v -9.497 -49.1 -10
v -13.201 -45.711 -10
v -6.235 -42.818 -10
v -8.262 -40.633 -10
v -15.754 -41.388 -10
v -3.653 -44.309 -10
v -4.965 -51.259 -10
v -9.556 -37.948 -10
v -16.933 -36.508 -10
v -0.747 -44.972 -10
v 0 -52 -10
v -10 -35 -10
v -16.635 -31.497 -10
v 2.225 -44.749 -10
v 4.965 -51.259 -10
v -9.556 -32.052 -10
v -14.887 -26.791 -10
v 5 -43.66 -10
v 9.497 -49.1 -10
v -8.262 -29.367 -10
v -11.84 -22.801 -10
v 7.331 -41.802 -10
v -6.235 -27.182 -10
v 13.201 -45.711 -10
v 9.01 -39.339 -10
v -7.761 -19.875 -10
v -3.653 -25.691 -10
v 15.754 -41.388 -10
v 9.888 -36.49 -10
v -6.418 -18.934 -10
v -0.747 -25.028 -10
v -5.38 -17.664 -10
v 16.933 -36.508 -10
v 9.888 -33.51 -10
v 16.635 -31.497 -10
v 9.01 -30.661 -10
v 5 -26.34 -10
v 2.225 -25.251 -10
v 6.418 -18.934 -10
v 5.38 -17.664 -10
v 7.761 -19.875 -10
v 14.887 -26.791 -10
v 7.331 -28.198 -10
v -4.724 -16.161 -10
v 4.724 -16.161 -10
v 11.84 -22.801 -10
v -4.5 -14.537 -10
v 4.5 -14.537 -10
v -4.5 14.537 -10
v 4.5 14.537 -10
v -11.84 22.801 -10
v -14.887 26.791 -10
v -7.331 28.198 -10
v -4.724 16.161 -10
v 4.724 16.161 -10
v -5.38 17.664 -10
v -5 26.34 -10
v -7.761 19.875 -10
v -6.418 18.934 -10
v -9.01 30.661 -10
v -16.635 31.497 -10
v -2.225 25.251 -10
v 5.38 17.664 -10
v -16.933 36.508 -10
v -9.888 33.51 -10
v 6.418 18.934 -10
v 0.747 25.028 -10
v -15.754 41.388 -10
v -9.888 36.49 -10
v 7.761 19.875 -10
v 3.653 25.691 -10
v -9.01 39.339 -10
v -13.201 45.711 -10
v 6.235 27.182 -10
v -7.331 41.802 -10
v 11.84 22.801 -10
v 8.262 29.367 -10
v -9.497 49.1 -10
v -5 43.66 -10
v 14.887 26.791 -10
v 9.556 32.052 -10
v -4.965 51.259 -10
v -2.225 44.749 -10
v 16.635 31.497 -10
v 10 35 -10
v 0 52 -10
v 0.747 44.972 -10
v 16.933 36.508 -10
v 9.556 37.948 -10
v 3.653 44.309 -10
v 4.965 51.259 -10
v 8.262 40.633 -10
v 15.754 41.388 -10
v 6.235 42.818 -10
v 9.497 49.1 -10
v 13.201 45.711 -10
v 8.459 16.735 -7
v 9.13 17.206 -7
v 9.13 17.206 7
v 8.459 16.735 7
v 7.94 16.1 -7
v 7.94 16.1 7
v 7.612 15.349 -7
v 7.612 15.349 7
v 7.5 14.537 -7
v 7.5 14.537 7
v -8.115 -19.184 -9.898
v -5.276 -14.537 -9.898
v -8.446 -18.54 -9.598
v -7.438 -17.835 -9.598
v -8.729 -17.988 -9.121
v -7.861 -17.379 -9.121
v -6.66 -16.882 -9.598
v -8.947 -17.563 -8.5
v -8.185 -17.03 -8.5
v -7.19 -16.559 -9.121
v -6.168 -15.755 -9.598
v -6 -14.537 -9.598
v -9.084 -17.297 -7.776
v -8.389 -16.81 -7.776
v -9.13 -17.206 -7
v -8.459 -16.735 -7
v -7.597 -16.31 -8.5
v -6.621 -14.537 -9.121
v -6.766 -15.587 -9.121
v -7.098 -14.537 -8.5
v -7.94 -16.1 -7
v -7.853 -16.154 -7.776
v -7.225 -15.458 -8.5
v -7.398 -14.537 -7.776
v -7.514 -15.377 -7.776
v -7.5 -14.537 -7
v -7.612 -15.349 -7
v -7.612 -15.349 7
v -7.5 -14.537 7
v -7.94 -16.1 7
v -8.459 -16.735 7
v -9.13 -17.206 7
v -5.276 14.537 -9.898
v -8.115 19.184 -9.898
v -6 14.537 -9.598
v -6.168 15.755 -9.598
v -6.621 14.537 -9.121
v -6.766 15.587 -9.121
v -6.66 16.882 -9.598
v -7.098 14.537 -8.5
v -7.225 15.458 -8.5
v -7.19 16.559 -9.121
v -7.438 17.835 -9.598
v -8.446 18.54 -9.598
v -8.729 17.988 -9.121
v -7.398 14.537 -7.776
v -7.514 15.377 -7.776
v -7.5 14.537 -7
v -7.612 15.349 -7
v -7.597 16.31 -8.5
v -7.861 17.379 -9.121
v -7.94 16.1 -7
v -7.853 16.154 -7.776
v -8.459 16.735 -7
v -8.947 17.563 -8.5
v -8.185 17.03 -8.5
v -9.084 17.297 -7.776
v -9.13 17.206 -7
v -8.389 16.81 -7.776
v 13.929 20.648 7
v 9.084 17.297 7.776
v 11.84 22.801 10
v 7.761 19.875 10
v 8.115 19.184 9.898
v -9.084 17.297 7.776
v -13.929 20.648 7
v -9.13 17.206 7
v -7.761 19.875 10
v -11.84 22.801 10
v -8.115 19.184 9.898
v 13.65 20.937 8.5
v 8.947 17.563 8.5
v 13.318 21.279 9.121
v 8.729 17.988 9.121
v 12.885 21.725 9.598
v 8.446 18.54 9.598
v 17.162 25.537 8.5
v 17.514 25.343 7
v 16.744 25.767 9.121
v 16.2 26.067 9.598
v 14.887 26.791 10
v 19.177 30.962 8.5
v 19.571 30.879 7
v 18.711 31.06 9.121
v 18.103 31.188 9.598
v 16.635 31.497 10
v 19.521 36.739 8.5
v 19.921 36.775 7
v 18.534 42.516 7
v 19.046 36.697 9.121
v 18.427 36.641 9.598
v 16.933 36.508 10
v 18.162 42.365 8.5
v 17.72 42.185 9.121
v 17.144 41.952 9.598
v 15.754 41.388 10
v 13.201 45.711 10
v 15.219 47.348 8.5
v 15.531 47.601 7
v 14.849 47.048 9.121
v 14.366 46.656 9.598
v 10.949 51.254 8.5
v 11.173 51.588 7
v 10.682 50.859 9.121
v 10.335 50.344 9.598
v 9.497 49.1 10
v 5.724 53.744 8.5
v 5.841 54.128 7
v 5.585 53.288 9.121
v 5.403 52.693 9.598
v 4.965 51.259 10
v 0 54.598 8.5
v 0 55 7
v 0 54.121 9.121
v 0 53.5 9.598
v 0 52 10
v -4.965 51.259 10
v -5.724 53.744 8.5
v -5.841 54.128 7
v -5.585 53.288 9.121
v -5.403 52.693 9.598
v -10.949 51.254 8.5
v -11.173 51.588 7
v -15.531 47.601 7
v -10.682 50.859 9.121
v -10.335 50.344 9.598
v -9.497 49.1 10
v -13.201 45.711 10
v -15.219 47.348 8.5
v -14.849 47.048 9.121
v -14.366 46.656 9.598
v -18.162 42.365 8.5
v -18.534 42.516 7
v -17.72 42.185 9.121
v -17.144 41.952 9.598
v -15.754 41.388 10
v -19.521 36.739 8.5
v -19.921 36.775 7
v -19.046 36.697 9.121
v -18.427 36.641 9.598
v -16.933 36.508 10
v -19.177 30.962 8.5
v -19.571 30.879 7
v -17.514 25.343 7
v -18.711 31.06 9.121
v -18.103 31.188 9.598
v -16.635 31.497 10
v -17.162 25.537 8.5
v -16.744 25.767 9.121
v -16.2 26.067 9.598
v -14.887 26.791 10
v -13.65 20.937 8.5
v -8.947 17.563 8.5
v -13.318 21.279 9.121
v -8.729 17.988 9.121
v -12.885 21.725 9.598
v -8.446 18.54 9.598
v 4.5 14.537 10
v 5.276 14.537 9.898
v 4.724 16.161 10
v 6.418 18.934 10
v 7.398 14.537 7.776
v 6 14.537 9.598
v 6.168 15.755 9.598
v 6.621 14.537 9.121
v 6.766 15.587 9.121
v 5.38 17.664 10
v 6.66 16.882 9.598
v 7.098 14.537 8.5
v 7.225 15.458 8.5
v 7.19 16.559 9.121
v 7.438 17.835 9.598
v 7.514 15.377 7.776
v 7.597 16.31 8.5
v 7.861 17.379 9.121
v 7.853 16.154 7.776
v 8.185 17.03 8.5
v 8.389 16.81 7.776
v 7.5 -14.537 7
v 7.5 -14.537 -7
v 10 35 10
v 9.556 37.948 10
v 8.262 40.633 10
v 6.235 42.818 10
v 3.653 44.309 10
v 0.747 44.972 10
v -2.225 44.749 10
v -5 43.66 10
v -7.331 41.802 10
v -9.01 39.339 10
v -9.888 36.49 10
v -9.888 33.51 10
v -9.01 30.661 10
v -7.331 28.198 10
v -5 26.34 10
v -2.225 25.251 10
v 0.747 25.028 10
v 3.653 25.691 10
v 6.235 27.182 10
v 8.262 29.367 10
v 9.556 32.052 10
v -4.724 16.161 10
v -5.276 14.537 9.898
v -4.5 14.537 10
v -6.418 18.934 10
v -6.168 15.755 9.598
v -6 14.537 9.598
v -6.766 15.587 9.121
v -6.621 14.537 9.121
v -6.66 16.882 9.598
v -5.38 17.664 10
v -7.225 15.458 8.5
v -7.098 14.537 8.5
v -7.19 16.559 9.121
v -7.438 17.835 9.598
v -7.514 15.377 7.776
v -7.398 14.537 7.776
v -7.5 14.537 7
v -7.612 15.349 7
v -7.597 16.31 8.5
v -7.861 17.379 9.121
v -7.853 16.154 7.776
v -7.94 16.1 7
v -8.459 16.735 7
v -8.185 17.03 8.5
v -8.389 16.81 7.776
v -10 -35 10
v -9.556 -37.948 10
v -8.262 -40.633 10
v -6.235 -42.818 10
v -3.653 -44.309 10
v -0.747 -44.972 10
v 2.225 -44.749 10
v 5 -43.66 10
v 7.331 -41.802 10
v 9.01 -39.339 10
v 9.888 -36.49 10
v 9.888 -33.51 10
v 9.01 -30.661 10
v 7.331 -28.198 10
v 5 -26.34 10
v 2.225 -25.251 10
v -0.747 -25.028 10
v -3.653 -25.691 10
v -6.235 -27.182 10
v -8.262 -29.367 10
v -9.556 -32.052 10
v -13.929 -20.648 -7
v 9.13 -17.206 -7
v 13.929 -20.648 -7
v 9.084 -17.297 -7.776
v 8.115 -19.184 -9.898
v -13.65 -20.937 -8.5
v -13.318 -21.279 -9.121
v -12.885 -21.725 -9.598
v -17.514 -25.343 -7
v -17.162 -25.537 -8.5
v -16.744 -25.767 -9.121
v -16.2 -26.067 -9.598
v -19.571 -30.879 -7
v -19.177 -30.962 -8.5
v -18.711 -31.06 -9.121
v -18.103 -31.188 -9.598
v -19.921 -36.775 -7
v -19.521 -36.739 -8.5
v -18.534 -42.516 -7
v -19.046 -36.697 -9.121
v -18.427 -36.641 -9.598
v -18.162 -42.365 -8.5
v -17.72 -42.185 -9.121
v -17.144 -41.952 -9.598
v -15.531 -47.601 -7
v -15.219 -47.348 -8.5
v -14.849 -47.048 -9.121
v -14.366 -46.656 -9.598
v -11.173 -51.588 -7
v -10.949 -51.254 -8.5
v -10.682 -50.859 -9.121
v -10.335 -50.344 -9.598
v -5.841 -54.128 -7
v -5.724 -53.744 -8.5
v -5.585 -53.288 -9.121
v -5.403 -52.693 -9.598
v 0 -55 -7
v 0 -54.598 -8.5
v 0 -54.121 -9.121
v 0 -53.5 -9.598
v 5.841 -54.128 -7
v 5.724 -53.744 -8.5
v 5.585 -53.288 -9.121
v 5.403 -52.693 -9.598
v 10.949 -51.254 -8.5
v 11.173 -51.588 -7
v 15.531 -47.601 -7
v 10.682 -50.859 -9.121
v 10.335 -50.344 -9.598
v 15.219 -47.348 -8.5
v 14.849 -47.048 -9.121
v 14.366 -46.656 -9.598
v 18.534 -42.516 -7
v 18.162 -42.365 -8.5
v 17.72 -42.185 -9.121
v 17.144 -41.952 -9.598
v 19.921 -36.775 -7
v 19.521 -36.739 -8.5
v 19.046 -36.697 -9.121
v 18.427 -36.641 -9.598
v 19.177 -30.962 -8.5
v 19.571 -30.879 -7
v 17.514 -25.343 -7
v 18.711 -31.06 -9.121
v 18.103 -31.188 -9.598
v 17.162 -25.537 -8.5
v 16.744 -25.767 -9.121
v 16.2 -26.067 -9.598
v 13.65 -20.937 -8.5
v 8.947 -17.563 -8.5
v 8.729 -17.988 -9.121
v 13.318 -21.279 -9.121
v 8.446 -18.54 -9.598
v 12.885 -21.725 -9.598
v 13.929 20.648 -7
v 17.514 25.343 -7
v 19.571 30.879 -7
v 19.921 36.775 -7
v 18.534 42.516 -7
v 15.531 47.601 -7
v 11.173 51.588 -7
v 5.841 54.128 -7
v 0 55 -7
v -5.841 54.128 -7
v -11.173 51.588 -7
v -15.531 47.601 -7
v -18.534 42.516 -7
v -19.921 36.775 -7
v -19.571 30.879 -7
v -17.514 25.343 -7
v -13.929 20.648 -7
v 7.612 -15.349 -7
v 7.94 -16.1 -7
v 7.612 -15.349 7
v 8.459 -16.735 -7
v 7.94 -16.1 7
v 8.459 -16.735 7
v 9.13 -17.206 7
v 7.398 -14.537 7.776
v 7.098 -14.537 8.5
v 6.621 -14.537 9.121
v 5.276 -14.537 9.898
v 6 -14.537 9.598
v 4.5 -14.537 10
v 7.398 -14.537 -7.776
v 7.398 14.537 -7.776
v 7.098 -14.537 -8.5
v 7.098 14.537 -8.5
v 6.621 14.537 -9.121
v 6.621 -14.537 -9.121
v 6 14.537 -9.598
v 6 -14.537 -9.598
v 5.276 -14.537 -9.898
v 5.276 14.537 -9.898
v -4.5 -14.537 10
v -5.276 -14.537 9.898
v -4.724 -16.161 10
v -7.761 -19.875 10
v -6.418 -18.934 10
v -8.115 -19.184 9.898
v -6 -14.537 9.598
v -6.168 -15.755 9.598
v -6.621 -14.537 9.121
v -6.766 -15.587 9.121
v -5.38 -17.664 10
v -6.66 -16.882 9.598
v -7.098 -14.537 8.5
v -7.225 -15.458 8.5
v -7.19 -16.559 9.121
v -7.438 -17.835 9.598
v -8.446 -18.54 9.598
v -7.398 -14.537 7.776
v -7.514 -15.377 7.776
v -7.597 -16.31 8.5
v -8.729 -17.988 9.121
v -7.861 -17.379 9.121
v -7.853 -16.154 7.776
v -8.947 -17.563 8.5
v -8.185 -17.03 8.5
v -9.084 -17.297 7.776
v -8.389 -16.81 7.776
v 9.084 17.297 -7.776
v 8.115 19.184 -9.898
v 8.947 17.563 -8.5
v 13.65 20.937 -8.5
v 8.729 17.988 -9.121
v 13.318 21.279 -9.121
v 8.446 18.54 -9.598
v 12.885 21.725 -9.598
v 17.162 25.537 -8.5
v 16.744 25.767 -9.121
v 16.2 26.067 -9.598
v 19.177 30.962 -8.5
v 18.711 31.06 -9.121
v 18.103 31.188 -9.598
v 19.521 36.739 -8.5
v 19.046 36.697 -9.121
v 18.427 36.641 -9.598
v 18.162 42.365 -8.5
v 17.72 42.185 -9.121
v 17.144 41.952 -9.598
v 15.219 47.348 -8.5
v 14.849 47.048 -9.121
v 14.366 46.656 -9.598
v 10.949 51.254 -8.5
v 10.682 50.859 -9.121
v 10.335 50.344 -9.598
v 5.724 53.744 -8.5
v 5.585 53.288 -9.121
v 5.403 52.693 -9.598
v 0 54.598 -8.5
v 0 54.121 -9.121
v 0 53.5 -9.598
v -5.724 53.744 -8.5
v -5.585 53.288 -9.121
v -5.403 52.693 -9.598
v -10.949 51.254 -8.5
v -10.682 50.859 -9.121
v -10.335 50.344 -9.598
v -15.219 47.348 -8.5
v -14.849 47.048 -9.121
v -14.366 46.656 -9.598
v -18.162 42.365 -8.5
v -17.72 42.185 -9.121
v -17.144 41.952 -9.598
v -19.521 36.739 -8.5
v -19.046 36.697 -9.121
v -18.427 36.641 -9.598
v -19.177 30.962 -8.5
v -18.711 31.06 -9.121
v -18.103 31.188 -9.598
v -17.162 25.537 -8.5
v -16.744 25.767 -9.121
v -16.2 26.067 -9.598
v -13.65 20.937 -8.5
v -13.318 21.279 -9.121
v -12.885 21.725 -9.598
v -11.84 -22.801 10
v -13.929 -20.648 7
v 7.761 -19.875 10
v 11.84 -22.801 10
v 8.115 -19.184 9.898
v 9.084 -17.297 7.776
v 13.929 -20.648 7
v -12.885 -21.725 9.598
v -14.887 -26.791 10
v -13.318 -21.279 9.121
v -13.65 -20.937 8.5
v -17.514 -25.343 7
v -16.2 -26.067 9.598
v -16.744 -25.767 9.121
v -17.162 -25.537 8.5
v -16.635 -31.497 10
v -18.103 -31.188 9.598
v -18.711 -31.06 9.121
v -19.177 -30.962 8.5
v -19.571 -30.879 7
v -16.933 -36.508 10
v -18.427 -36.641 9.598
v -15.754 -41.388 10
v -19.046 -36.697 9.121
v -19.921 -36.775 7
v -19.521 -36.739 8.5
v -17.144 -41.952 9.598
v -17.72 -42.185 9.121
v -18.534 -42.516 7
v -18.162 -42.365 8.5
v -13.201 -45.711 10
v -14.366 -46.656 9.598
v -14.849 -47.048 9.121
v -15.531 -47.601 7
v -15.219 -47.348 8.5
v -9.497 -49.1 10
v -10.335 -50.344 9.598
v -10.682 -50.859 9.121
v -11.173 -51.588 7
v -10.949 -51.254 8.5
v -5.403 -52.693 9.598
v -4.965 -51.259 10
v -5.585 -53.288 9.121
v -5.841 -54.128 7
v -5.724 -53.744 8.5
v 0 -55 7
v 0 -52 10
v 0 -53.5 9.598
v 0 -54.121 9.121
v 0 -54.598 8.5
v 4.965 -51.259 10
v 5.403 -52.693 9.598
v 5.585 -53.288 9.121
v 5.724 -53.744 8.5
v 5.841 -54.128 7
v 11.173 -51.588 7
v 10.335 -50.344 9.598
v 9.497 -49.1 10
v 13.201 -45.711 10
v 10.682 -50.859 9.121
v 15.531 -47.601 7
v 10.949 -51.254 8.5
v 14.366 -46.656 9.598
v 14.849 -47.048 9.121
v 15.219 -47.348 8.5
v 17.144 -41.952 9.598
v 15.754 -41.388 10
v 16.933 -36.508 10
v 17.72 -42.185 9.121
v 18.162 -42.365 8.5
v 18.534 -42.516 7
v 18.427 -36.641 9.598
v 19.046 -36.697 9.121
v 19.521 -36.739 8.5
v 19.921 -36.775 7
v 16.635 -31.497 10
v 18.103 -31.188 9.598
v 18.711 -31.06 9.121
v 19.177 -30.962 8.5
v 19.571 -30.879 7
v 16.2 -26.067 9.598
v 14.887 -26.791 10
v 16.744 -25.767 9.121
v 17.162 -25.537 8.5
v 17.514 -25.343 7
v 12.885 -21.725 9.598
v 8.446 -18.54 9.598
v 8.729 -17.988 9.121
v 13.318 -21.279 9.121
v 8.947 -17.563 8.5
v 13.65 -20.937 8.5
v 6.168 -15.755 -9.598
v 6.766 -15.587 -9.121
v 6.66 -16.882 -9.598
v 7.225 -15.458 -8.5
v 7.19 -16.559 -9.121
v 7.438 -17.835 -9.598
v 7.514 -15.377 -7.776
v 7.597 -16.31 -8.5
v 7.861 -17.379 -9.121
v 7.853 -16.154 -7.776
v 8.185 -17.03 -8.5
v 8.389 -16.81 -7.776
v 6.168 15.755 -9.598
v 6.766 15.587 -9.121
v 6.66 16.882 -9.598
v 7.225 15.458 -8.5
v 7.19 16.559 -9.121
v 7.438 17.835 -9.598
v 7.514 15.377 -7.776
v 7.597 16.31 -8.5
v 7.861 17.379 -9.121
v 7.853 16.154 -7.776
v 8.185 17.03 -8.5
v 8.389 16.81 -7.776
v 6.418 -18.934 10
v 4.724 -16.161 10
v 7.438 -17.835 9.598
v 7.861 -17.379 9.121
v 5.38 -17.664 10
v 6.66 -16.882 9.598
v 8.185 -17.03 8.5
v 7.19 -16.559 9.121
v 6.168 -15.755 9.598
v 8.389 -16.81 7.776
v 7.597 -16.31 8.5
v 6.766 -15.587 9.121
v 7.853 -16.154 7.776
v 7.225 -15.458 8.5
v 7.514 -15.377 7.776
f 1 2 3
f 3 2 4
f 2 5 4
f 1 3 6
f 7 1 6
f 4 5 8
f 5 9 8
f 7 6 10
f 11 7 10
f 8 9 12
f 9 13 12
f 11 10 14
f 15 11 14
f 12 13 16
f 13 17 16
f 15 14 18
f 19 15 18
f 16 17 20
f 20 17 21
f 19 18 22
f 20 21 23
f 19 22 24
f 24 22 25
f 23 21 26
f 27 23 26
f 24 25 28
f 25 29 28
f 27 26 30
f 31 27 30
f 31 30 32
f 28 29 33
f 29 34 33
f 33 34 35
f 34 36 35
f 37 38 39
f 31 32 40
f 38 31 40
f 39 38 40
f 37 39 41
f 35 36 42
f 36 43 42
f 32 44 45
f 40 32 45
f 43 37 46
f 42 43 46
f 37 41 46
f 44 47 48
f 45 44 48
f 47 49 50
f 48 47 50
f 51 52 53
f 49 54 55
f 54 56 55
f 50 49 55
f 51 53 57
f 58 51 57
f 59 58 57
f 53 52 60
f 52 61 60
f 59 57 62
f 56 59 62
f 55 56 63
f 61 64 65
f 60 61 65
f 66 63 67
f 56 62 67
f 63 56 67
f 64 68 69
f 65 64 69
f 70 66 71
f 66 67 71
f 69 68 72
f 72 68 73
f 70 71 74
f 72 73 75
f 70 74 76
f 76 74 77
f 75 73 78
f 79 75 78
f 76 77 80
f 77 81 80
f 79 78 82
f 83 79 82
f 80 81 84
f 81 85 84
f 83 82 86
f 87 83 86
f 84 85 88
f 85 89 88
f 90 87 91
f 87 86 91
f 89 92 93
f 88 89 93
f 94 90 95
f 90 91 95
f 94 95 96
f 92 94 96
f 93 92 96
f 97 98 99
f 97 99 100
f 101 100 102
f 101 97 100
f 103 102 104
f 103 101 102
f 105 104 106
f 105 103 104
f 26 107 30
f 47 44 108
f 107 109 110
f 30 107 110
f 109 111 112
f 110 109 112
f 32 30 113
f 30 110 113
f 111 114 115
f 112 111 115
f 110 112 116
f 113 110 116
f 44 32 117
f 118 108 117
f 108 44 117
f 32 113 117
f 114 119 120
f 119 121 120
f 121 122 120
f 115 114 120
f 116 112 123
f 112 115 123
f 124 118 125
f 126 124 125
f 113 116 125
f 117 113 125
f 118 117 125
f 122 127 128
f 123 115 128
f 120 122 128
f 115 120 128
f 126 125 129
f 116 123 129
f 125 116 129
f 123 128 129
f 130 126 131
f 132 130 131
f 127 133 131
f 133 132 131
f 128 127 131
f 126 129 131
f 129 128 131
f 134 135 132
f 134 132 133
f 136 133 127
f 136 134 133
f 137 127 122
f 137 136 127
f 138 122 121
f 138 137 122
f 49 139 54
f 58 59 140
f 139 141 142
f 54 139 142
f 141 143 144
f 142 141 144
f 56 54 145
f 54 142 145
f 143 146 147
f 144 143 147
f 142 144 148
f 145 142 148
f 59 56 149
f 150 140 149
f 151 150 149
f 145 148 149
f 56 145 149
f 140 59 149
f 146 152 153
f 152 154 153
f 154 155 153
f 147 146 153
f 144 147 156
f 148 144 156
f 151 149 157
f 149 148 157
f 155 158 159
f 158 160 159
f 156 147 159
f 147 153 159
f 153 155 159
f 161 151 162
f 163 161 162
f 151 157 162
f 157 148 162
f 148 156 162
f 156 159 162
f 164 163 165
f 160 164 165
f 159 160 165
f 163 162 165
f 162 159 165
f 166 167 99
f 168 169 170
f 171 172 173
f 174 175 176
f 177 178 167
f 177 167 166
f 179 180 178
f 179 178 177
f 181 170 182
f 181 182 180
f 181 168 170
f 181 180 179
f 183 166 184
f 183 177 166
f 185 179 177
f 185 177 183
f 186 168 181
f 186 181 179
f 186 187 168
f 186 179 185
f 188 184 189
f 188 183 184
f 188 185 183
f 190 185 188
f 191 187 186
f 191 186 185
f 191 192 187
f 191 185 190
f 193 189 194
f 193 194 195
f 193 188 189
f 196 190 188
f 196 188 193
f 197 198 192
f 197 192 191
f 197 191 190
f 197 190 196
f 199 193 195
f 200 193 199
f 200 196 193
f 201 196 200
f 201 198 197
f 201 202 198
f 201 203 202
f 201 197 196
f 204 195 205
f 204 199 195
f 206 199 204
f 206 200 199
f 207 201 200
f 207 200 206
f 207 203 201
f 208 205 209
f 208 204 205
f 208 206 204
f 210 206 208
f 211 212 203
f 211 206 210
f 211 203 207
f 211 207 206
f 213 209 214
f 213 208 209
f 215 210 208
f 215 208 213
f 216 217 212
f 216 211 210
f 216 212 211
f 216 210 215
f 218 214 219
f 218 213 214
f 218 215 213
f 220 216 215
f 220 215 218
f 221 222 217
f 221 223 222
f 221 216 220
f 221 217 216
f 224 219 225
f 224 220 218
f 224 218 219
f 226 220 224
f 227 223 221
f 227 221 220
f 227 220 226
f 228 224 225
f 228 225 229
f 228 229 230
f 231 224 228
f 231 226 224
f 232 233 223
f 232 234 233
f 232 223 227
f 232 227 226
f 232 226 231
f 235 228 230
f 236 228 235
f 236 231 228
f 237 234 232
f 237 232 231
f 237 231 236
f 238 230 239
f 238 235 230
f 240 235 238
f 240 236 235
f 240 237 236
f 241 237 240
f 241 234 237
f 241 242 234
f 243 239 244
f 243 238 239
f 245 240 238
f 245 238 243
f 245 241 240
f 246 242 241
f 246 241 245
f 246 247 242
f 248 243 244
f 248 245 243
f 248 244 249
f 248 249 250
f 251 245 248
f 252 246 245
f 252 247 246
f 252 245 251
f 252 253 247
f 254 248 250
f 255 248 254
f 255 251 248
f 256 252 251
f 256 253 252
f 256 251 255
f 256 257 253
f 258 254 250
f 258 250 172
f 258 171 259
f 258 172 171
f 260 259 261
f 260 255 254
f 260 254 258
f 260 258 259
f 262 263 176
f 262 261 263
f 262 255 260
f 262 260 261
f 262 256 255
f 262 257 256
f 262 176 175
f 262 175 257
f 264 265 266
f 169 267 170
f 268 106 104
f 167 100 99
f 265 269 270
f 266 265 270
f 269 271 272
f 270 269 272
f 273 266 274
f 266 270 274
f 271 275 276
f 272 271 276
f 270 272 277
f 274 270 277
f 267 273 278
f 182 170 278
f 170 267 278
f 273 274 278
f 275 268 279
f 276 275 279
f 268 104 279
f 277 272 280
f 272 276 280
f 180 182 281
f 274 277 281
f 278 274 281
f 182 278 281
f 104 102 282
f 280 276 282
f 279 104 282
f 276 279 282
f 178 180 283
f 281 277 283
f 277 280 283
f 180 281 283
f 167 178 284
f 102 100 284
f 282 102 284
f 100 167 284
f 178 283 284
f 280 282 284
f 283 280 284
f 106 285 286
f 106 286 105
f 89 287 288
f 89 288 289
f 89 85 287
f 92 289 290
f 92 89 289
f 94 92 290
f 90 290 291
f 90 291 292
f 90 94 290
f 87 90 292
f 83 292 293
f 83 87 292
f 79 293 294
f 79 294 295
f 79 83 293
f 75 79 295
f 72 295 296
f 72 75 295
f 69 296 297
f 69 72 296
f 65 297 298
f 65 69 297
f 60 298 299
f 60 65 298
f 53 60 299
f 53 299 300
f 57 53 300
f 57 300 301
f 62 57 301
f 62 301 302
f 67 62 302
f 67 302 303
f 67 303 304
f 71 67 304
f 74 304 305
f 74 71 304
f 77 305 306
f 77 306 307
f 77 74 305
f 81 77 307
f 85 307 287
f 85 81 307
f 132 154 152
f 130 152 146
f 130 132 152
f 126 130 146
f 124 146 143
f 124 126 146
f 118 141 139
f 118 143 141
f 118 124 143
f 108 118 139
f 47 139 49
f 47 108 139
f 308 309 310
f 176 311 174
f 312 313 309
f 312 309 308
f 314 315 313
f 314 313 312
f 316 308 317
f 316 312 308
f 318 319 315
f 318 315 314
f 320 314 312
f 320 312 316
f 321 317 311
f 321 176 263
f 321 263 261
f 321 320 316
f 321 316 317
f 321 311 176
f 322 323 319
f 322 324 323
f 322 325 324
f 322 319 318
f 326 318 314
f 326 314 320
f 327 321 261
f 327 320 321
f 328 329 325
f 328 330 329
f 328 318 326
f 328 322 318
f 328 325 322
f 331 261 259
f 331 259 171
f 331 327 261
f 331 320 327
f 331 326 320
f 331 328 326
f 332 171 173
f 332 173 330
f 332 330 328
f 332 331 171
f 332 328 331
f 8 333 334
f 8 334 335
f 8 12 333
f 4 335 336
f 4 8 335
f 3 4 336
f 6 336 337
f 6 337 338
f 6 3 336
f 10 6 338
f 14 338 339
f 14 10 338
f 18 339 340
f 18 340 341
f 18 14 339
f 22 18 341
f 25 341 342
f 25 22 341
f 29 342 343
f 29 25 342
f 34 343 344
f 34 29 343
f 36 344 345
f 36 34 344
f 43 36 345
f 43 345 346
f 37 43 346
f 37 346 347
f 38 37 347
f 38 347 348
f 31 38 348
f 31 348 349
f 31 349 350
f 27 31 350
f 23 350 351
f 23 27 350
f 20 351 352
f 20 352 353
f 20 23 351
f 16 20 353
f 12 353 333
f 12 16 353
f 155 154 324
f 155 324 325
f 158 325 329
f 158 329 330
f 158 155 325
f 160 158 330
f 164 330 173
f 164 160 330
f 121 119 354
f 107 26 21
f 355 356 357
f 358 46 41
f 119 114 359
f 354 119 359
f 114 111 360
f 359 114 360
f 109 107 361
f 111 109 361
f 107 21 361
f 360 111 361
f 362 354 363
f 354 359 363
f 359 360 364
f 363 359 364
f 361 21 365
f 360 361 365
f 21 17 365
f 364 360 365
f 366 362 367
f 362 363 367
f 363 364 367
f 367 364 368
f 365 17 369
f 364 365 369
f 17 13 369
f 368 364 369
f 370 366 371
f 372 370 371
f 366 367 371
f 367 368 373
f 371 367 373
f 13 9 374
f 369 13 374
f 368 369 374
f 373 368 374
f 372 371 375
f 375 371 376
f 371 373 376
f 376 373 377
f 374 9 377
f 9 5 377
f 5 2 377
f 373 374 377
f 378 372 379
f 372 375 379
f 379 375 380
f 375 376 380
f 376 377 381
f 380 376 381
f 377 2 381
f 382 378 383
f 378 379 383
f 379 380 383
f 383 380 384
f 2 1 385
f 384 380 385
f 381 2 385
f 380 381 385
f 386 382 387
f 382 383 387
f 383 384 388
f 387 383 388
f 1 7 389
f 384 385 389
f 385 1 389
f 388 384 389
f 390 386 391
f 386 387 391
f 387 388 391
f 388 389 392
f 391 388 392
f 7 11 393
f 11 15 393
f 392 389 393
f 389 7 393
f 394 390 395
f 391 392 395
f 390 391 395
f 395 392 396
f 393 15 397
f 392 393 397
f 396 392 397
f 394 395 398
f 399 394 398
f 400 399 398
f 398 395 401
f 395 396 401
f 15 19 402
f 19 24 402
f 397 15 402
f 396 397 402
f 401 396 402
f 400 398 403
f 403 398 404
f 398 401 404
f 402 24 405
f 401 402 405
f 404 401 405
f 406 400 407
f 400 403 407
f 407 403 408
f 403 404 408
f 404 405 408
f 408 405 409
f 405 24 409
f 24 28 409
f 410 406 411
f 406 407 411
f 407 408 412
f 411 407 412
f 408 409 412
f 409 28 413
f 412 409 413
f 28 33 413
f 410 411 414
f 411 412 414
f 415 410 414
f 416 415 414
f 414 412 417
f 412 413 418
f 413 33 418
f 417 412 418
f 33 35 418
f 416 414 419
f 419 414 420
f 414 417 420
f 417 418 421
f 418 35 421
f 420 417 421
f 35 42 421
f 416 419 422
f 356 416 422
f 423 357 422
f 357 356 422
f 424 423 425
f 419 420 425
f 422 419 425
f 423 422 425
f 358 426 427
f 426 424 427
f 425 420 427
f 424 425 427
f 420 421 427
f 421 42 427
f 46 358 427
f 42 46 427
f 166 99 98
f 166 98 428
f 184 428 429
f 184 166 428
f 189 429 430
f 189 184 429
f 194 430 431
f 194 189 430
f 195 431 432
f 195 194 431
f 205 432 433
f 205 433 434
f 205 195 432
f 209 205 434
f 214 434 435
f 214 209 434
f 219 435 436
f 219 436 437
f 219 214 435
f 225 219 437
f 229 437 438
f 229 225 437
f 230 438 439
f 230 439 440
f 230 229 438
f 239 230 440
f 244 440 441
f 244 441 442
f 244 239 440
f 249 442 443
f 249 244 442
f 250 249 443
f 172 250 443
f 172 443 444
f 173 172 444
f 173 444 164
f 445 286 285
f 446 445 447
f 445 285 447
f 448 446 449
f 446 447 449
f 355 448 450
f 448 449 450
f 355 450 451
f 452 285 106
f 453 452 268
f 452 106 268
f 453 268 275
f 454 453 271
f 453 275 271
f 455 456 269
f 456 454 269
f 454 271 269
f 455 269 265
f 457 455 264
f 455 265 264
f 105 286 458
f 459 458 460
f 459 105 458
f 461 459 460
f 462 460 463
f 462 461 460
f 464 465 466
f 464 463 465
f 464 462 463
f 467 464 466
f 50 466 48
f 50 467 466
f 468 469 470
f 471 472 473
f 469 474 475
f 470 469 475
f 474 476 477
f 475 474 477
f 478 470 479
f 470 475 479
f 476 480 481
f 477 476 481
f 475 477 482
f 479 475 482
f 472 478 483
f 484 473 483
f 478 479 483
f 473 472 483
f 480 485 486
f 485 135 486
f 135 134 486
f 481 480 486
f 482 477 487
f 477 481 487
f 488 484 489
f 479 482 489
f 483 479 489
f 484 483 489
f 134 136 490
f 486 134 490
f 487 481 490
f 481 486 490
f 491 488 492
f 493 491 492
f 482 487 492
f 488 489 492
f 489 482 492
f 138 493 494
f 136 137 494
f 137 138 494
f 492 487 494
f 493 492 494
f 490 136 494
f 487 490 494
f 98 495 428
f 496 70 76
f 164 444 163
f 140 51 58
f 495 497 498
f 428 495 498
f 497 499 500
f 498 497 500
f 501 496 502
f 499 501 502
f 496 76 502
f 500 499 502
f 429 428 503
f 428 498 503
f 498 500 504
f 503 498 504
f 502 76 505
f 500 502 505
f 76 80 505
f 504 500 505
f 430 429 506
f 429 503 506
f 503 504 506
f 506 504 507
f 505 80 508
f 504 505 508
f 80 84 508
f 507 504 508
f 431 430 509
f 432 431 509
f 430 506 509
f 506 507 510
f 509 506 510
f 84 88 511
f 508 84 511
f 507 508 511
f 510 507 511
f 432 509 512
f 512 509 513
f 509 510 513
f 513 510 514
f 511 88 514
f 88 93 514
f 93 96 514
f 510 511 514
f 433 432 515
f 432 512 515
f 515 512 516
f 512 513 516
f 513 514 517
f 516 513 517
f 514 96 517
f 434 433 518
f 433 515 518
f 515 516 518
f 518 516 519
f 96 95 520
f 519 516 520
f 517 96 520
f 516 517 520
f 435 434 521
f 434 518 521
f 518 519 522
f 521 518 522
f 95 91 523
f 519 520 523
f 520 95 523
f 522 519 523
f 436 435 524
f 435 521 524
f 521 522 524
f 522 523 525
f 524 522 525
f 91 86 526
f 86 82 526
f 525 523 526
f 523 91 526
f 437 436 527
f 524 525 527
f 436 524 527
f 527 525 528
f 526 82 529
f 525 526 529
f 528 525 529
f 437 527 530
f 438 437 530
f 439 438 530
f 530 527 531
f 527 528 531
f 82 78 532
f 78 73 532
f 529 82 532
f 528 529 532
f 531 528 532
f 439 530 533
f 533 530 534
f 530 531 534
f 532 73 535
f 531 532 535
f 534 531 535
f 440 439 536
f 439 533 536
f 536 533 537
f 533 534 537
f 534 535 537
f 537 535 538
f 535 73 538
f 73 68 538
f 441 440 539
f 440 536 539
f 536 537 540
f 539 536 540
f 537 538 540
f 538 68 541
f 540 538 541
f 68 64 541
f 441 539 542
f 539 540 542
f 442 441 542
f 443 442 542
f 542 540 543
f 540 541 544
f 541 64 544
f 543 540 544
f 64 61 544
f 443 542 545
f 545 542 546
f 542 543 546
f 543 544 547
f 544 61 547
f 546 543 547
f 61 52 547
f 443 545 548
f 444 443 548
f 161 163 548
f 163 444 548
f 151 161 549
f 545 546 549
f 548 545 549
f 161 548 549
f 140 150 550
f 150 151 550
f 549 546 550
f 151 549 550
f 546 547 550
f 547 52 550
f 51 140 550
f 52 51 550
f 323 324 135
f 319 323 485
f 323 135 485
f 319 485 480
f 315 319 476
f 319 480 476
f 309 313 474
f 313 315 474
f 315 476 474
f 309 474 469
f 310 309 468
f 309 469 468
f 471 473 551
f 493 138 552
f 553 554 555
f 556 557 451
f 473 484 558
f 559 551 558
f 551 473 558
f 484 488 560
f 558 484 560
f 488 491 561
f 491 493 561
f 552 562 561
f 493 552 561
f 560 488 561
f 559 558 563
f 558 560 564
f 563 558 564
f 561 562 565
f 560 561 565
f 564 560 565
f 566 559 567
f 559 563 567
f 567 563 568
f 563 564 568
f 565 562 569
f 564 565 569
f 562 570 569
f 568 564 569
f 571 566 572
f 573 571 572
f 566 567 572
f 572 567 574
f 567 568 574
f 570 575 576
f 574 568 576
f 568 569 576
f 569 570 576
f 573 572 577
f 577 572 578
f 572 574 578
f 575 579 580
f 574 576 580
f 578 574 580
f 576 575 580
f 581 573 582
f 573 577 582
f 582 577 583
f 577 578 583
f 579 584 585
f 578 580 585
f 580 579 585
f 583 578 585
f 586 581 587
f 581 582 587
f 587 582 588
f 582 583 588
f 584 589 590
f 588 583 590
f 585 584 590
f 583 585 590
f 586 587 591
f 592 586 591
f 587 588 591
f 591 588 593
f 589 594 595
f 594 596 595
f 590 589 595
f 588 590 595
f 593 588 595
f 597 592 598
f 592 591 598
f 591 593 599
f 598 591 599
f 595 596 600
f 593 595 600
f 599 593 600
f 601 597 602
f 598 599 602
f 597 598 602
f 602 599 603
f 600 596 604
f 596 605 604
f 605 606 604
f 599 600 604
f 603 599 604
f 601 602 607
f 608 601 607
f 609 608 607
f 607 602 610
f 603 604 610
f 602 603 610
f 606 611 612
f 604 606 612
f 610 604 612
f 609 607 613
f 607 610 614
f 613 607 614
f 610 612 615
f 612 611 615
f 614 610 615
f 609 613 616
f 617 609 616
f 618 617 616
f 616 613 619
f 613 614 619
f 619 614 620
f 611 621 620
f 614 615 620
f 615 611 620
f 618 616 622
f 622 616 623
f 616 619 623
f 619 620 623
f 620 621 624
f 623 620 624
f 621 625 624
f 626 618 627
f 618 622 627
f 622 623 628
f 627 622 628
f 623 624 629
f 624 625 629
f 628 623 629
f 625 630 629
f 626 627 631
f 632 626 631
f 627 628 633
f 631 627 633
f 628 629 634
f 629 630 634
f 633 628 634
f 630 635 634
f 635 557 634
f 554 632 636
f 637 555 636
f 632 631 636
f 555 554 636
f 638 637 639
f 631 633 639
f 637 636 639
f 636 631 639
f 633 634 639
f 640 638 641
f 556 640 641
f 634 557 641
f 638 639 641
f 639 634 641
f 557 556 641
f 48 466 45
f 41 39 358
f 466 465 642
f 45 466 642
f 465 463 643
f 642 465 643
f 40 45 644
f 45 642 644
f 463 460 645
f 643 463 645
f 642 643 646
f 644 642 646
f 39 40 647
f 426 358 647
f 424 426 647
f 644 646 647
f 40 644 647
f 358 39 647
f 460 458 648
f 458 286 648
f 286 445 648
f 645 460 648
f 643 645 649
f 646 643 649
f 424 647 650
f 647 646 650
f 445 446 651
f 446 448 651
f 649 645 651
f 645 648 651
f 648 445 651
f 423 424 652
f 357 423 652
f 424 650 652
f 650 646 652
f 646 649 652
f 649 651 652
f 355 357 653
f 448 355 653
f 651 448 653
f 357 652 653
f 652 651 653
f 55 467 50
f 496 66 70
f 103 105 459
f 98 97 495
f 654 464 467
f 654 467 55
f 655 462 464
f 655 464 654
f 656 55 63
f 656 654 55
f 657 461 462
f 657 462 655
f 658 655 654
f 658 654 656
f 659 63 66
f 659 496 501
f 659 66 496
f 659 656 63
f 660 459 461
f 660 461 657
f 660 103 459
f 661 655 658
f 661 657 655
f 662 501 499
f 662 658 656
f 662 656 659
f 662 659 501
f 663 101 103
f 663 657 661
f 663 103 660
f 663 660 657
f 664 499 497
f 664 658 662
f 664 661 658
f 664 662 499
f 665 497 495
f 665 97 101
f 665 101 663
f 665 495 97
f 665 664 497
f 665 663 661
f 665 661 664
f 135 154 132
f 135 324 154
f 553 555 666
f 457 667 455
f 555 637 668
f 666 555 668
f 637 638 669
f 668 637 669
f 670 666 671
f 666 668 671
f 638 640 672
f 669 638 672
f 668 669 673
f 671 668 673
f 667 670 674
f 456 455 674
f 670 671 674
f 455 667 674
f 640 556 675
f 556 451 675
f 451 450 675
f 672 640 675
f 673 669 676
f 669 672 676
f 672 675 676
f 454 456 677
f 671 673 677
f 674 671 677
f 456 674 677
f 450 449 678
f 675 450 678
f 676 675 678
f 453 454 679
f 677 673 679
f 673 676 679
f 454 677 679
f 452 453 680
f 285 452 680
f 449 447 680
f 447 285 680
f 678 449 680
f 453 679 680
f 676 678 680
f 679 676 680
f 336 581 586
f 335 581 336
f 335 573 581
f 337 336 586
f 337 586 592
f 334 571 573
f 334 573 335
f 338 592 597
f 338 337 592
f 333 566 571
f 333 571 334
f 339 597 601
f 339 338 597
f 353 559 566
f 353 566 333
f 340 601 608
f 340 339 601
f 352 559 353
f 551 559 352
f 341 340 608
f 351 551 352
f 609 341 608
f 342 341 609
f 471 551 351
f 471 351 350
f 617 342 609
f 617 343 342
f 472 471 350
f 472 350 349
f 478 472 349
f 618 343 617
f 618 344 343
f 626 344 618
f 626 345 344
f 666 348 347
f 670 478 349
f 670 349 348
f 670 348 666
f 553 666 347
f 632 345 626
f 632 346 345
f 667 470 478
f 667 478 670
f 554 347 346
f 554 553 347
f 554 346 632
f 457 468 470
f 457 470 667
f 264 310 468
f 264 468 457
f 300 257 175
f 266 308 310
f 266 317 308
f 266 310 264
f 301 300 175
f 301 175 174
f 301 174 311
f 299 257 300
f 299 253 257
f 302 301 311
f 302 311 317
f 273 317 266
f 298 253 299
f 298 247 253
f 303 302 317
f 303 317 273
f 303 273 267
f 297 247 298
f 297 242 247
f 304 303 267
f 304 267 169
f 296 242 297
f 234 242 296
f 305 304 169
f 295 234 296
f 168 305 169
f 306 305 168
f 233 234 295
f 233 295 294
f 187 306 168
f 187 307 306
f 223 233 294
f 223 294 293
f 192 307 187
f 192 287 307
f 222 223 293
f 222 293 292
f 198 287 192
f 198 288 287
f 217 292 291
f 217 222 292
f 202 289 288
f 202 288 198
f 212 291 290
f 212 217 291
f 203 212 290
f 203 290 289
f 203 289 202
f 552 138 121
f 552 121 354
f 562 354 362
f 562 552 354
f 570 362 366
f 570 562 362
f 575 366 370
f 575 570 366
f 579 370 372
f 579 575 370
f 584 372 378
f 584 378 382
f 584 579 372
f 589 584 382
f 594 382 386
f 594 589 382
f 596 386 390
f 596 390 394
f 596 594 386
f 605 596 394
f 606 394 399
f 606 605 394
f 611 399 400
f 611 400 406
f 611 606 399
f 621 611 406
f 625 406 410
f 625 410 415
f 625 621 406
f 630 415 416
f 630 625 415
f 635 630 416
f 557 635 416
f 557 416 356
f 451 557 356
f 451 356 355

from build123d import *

# Parameters (mm, degrees)
SKETCH1_R           = 10
BOSS_EXTRUDE1_DEPTH = 10
FILLET1_R           = 3


with BuildPart() as part:
    # Sketch1 → Boss-Extrude1 (new, symmetric)
    with BuildSketch(Plane.XY):
        with BuildLine():
            Line((-7.5, 16.459503782), (-7.5, -16.459503782))
            ThreePointArc((-7.5, -16.459503782), (0, -55), (7.5, -16.459503782))
            Line((7.5, -16.459503782), (7.5, 16.459503782))
            ThreePointArc((7.5, 16.459503782), (0, 55), (-7.5, 16.459503782))
        make_face()
        with Locations((0, 35)):
            Circle(SKETCH1_R, mode=Mode.SUBTRACT)
        with Locations(Location((0, -35, 0), (0, 0, 180))):
            Circle(SKETCH1_R, mode=Mode.SUBTRACT)
    extrude(amount=BOSS_EXTRUDE1_DEPTH, both=True)

    # Fillet1
    fillet1_edges = [part.edges().sort_by_distance(p)[0] for p in [
        (0, -55, 10),
        (7.5, 0, 10),
        (0, 55, 10),
        (7.5, 0, -10),
        (0, -55, -10),
        (-7.5, 0, -10),
        (0, 55, -10),
        (7.5, 16.459503782, 0),
        (7.5, -16.459503782, 0),
        (-7.5, -16.459503782, 0),
        (-7.5, 16.459503782, 0),
        (-7.5, 0, 10),
    ]]
    fillet(fillet1_edges, radius=FILLET1_R)


solid = part.part
